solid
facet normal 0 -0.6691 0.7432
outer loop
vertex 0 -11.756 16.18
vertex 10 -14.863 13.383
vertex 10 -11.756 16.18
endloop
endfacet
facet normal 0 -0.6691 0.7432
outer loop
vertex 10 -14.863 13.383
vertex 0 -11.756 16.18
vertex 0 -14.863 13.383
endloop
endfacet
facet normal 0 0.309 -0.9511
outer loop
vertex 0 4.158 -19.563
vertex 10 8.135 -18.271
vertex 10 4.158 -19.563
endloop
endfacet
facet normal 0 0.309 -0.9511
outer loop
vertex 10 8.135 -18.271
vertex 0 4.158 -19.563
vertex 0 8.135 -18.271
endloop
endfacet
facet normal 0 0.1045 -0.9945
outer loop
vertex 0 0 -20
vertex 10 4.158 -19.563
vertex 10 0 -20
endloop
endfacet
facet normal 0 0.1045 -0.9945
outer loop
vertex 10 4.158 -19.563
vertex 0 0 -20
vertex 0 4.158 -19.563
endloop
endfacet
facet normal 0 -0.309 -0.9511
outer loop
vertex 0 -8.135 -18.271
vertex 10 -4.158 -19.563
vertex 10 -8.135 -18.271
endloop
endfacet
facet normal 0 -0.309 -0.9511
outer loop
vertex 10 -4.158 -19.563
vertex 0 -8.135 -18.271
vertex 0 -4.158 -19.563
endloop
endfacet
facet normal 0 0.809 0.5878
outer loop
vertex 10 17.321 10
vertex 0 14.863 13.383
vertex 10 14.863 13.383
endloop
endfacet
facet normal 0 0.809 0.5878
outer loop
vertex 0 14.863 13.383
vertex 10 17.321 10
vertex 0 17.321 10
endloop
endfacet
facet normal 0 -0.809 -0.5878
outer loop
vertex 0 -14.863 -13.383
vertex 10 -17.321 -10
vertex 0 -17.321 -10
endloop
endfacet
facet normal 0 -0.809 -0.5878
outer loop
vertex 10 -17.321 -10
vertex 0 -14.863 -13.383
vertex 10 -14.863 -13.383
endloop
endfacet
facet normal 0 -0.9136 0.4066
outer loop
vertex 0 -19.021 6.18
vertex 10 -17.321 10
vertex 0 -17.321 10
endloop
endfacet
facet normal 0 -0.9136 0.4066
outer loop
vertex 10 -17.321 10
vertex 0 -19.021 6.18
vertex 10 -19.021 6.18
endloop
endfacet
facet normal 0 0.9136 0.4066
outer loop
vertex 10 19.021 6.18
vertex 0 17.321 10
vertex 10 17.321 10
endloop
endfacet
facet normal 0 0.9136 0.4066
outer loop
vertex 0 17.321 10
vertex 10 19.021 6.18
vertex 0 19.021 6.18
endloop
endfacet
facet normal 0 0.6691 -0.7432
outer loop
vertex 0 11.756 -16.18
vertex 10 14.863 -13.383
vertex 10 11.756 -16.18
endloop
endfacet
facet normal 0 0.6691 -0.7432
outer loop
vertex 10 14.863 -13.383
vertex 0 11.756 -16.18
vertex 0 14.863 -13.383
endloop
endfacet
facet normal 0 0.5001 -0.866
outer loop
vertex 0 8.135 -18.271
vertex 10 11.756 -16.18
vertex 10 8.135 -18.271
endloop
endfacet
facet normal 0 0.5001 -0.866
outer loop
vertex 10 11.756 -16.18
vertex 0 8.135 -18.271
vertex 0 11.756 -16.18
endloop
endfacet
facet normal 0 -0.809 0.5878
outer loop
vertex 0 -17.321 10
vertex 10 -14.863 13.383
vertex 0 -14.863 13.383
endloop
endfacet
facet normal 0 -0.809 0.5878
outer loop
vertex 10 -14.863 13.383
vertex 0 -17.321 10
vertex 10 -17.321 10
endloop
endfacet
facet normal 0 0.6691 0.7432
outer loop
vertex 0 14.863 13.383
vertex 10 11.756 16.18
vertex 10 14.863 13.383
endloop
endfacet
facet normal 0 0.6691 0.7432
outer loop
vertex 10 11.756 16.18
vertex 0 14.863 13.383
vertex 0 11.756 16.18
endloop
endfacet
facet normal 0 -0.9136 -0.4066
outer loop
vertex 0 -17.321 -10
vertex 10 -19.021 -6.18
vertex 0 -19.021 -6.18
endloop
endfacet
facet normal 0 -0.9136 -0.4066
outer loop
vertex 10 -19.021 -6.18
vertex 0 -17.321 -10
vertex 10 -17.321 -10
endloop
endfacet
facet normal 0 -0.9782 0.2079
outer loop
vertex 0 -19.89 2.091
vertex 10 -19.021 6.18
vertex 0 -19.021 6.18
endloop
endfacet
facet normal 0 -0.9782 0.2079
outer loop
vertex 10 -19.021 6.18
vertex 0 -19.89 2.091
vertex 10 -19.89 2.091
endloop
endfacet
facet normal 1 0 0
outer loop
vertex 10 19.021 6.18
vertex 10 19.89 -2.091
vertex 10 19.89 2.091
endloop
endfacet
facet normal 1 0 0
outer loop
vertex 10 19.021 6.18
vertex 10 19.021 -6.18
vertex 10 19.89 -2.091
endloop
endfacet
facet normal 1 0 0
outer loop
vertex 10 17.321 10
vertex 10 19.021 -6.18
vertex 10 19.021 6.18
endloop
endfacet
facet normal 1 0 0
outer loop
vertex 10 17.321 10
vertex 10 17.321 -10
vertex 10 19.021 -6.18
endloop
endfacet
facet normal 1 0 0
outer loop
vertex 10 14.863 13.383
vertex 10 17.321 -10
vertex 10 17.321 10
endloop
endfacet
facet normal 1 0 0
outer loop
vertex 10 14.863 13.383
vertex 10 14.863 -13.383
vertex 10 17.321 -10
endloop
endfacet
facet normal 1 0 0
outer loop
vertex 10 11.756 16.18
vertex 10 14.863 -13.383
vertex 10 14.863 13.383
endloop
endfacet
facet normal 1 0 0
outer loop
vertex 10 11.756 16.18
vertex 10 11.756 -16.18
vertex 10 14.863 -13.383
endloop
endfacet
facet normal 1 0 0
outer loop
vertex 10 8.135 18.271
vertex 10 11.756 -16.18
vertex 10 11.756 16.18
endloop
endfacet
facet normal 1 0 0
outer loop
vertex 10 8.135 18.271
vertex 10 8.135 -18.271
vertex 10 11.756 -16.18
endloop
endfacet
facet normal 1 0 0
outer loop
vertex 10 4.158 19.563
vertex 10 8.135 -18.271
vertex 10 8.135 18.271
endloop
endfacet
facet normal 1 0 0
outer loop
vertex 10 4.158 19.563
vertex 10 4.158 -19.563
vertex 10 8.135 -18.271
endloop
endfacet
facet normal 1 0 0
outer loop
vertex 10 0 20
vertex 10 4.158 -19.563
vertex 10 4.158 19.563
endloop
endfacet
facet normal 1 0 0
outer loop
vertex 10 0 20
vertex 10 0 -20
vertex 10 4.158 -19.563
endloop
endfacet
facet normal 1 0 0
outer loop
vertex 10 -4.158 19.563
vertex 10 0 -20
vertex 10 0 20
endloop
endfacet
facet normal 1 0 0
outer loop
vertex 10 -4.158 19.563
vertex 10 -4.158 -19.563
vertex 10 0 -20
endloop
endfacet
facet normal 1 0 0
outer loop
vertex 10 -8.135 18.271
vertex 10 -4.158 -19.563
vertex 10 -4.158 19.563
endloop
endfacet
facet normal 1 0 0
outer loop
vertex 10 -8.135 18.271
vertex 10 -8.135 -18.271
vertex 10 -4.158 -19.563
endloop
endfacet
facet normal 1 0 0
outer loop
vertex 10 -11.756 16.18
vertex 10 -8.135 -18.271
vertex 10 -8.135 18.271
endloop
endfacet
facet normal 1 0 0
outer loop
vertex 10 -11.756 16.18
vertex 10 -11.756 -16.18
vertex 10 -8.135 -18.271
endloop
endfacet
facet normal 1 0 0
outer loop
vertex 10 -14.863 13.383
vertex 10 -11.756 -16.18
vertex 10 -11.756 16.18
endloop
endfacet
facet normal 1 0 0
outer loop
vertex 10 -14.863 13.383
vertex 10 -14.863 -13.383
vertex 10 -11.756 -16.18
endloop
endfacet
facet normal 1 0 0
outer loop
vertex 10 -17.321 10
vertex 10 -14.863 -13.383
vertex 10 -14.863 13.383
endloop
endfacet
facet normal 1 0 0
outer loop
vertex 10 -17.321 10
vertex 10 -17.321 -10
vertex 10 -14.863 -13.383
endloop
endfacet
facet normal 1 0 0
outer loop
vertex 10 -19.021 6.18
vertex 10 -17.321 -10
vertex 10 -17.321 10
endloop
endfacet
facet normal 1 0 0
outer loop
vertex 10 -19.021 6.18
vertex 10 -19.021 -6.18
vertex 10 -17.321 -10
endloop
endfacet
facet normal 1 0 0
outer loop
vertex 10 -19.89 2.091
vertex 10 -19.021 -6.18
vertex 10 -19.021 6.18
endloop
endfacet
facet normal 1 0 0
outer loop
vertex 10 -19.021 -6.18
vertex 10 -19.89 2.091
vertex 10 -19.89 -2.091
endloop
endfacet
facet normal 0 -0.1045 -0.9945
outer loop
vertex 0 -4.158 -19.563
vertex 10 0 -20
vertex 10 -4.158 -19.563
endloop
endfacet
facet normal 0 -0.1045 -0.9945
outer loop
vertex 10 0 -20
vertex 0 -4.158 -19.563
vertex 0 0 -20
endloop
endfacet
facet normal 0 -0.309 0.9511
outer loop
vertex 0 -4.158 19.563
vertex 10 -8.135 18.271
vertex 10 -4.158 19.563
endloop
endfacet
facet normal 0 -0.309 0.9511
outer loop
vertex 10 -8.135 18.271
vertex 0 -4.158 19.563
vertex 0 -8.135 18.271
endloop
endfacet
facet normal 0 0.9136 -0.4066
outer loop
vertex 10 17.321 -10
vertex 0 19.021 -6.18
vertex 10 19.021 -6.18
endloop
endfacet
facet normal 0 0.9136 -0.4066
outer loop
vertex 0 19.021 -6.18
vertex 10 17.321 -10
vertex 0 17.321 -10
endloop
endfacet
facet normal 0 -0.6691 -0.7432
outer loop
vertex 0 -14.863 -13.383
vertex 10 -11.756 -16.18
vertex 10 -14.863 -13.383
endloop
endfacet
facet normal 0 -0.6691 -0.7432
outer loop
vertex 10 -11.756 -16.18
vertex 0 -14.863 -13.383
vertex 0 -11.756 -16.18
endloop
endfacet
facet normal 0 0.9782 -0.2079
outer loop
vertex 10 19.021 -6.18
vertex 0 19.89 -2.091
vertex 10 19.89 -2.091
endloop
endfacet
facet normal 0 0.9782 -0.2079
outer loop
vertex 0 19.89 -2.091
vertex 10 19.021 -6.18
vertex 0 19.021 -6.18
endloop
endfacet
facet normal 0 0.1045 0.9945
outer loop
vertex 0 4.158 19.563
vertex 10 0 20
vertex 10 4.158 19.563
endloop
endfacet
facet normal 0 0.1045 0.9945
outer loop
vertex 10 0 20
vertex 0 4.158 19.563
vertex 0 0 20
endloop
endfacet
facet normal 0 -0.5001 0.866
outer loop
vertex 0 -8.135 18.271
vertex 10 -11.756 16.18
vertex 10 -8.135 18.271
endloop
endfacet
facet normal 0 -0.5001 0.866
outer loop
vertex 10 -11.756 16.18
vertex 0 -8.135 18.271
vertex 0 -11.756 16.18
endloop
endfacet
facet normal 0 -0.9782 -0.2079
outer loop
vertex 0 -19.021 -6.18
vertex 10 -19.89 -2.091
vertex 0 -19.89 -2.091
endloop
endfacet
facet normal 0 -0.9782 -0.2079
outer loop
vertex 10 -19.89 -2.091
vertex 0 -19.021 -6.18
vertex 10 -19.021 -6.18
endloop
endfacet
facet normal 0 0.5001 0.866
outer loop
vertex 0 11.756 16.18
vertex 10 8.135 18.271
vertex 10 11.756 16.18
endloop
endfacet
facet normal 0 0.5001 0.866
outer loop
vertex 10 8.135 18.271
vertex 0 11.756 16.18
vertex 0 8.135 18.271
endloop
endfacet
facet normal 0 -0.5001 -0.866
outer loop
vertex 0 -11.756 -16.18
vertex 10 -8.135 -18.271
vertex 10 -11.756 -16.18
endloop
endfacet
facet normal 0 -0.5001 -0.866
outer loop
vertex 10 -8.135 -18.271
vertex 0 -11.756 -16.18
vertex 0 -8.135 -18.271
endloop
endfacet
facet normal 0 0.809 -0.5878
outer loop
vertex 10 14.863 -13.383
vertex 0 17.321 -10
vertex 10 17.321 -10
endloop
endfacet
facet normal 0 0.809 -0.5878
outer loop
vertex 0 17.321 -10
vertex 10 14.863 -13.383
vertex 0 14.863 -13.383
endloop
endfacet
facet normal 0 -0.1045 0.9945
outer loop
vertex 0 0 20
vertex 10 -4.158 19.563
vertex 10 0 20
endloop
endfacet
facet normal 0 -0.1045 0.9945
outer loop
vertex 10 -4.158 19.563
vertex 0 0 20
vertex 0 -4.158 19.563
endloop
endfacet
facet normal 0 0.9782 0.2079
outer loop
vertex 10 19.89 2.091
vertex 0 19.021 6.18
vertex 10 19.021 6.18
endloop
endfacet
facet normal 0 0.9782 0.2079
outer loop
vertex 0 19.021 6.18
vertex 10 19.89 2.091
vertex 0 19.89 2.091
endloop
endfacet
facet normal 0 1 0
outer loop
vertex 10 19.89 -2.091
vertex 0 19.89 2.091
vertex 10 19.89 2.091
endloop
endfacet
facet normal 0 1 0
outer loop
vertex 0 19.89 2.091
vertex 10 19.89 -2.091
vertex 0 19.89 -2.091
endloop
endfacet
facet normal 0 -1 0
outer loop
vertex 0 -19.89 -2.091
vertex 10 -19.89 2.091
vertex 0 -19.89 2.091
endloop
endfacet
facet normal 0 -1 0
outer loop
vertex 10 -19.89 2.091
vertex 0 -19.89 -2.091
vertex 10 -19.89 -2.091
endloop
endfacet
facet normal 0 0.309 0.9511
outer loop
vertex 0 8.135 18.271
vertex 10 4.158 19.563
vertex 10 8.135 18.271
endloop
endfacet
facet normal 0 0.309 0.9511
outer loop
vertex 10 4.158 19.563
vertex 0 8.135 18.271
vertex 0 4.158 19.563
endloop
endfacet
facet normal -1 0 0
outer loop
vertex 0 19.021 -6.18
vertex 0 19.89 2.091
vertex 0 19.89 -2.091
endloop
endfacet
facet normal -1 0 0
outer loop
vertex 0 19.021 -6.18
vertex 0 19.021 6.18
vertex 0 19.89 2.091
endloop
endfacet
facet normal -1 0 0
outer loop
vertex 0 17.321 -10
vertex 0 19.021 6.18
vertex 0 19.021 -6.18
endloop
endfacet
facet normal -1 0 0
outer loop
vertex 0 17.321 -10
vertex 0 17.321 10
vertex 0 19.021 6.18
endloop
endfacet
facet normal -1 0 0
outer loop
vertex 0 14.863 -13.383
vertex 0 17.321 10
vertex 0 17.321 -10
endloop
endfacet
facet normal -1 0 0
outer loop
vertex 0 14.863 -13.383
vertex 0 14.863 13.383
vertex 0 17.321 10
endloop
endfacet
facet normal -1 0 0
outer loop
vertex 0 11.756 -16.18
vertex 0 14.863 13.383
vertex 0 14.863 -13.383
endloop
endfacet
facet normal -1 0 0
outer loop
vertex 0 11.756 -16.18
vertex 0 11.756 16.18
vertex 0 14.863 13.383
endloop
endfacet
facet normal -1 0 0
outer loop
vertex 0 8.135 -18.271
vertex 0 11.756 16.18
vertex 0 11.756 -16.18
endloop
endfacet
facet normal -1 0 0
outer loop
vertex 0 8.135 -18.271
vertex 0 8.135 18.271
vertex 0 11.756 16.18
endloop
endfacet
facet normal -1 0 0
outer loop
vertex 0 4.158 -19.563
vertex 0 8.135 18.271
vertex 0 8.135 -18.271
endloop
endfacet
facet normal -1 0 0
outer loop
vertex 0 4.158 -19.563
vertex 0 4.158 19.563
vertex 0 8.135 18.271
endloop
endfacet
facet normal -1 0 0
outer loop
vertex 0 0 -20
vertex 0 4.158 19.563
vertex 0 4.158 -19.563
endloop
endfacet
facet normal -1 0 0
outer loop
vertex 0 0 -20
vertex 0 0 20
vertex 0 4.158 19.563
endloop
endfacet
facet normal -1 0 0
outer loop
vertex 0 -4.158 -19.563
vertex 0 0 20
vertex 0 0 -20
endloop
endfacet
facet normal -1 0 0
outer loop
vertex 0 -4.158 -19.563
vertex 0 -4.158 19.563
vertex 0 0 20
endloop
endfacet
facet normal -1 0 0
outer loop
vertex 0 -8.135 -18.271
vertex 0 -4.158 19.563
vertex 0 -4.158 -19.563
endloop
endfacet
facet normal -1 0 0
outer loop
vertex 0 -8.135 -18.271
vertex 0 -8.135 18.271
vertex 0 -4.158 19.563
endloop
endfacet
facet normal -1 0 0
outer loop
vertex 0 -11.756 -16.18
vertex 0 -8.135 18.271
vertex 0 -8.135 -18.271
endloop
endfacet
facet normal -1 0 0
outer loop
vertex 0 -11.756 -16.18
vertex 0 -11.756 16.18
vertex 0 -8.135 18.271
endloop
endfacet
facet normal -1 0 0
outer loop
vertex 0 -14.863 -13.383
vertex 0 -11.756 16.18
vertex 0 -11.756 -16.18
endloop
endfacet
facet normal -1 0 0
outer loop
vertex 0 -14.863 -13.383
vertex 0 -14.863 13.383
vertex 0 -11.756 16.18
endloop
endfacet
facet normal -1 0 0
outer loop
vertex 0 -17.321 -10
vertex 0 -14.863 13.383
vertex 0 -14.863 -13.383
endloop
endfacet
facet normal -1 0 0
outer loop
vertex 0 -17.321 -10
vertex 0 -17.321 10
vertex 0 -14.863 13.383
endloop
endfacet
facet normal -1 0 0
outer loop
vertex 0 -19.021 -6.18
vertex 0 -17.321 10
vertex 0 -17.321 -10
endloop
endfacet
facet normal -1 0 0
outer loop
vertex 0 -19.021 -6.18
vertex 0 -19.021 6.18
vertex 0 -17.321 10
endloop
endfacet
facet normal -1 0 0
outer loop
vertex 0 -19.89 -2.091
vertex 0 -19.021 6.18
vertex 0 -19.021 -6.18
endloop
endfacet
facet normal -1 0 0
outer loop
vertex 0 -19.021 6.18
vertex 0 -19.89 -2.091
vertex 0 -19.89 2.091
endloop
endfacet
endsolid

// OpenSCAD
include <dcl.scad>

// make an unnamed object
wheel = [
  dDifference(),[
    [
      dRotate([0,90,0]),
      dCylinder(h=10,r=20)
    ],
    [
      dTranslate([5,0,0]),
      dRotate([0,90,0]),
      dCylinder(h=10,r=16)
    ]
  ]
];

/*
// make a named union using local variable via "let"
body = let( bodywidth = 100, bodylength = 200, bodyheight = 50,
            centerwidth = 140, centerlength = 80, centerheight = 50)
       dUnion("body", [
           dBox(bodywidth,bodyheight,bodylength,"main"),
           dTranslate([-(centerwidth-bodywidth)/2,(bodylength-centerlength)/2,0],
                dBox(centerwidth,centerheight,centerlength,"center"),
                "center_translate"
           )
       ]);

// create an axle based on the main body width
axle = dRotate([0,90,0],
           dCylinder(h=gVal(body,"main.width")+20,r=2,name="shaft")
       );

// assemble car
car = dUnion("car", [
          body,
          // position axles, make named copies
          dTranslate([-(gVal(axle,"shaft.height") - gVal(body,"main.width"))/2,
                      gVal(body,"center_translate.vec")[1]/2,
                      10],
              dCopy(axle,"front_axle")
          ),
          dTranslate([-(gVal(axle,"shaft.height") - gVal(body,"main.width"))/2,
                      gVal(body,"main.depth") - gVal(body,"center_translate.vec")[1]/2,
                      10],
              dCopy(axle,"back_axle")
          ),
          // add wheels
          dTranslate([-(gVal(axle,"shaft.height") - gVal(body,"main.width"))/2 + gVal(axle,"shaft.height"),
                      gVal(body,"center_translate.vec")[1]/2,
                      10],
              dCopy(wheel,"front_left")
          ),
          dTranslate([-(gVal(axle,"shaft.height") - gVal(body,"main.width"))/2 + gVal(axle,"shaft.height"),
                      gVal(body,"main.depth") - gVal(body,"center_translate.vec")[1]/2,
                      10],
              dCopy(wheel,"back_left")
          ),
          dTranslate([-(gVal(axle,"shaft.height") - gVal(body,"main.width"))/2,
                      gVal(body,"center_translate.vec")[1]/2,
                      10],
              dRotate([0,0,180],dCopy(wheel,"front_right"))
          ),
          dTranslate([-(gVal(axle,"shaft.height") - gVal(body,"main.width"))/2,
                      gVal(body,"main.depth") - gVal(body,"center_translate.vec")[1]/2,
                      10],
              dRotate([0,0,180],dCopy(wheel,"back_right"))
          )
      ]);
*/

dcl_make(wheel);
